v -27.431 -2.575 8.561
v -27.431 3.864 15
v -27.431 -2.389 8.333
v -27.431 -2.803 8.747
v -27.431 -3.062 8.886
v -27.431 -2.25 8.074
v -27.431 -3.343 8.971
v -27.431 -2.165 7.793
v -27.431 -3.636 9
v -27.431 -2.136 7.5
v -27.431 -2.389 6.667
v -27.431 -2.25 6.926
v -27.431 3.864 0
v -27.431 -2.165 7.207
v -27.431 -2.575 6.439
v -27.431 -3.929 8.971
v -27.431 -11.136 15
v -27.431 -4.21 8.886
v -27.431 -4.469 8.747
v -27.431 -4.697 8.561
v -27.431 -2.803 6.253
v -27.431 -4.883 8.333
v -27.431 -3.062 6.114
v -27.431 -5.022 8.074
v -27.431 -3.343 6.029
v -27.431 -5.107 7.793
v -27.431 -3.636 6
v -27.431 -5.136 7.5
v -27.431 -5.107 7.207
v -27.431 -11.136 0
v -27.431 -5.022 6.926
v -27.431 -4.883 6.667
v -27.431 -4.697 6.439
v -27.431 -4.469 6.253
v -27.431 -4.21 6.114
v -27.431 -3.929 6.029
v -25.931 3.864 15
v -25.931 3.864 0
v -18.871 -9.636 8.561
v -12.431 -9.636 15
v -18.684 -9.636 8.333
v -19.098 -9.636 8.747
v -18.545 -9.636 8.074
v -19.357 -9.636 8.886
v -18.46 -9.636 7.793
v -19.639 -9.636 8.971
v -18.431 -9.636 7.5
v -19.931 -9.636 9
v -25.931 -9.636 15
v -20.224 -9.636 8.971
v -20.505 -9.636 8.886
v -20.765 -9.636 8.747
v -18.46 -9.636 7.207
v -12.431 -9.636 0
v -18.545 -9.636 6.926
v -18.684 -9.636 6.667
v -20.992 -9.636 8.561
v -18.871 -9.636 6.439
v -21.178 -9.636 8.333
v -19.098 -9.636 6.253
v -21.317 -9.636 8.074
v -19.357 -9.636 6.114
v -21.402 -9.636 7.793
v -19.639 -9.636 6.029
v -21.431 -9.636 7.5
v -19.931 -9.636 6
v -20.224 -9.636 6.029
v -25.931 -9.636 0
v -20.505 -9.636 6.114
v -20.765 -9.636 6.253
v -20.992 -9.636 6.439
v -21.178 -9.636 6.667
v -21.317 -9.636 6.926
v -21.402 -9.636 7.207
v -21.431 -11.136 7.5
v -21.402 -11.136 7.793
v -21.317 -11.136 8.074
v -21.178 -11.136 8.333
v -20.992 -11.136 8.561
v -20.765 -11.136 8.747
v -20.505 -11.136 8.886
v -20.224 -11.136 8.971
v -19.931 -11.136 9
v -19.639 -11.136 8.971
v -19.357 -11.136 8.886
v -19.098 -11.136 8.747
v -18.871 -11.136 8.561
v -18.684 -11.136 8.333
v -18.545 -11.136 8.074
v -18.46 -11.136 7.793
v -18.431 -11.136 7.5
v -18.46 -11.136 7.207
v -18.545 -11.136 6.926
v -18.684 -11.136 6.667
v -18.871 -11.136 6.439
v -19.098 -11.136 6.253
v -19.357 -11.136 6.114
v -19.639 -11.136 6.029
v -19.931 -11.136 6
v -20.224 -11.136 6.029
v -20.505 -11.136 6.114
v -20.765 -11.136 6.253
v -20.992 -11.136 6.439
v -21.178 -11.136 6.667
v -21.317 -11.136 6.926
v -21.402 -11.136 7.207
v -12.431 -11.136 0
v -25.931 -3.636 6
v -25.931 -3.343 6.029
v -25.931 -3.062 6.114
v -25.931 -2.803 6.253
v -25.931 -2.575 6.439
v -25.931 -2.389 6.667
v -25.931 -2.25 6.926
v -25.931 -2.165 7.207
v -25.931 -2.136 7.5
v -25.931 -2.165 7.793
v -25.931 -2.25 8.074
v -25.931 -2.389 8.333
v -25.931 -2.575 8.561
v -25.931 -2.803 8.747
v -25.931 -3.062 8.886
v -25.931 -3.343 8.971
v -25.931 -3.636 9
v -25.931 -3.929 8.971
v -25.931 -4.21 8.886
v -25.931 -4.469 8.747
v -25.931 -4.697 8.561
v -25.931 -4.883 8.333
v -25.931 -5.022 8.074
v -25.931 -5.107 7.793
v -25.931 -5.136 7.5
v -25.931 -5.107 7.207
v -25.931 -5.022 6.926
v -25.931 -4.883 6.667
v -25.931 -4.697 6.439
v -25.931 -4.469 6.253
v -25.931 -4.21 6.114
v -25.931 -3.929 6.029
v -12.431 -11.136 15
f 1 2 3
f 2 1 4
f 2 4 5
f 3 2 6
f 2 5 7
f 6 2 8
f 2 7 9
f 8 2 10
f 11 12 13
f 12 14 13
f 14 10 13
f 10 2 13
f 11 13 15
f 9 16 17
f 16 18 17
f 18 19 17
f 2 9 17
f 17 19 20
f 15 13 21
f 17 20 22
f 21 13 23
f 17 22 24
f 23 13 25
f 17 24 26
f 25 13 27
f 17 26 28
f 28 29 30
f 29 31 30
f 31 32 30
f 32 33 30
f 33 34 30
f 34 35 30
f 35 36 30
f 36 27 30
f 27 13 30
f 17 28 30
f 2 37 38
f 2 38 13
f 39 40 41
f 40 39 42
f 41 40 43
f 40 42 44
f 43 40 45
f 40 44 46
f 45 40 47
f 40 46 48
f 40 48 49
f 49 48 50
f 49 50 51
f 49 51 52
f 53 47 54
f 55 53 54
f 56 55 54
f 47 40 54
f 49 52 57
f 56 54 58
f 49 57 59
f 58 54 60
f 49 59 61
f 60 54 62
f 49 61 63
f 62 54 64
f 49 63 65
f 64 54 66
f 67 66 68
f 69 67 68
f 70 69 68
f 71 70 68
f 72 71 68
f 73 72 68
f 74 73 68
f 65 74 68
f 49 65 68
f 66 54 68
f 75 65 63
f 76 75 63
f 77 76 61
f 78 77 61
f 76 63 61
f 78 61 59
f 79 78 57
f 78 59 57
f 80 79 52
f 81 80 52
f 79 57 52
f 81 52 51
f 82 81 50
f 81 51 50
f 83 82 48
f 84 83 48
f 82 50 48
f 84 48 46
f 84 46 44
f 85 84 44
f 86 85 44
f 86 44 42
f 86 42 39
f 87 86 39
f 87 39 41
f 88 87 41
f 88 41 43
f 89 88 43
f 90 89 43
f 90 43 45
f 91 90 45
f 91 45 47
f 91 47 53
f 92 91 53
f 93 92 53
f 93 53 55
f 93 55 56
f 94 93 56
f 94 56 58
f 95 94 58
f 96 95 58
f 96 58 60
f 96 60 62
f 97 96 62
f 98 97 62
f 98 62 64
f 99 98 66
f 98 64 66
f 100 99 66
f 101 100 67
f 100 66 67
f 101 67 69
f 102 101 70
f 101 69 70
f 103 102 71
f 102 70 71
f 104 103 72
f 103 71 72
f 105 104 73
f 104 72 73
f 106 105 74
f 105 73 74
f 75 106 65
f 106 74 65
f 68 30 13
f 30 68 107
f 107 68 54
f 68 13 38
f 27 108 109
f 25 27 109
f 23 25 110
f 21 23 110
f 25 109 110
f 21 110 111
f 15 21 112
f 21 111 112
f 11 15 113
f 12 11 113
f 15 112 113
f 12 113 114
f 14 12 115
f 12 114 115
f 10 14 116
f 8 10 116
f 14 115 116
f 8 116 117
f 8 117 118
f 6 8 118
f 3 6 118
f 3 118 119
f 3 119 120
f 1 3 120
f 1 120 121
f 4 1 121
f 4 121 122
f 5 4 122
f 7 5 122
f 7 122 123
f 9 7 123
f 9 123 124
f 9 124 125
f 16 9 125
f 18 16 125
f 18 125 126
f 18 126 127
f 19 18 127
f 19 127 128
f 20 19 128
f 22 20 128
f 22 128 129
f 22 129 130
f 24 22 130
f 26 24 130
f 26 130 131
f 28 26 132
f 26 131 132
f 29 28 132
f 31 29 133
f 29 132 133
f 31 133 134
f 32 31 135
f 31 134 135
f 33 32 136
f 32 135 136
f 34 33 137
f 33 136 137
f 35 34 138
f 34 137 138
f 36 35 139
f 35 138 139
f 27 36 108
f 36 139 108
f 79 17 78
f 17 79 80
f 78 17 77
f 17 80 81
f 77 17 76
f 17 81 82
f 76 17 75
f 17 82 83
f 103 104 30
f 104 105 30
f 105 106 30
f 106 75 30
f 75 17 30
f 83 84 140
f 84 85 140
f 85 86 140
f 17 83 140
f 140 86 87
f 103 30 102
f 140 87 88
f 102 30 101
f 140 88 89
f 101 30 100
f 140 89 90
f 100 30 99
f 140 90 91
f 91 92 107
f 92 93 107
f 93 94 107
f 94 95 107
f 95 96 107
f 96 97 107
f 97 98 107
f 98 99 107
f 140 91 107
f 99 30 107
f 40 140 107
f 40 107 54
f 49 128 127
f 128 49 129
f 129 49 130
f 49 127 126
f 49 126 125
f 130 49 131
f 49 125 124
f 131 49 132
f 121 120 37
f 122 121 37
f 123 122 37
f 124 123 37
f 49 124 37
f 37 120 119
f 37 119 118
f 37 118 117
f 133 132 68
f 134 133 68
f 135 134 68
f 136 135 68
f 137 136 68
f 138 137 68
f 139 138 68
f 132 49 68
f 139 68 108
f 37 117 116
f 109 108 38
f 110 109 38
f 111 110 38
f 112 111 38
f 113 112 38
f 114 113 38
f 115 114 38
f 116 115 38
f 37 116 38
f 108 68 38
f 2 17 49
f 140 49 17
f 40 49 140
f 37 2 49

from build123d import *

# Parameters (mm, degrees)
EXTRUSION1_DEPTH = 15
ESQUISSE2_R      = 1.5
EXTRUSION2_DEPTH = 15
ESQUISSE3_R      = 1.5
EXTRUSION3_DEPTH = 15


with BuildPart() as part:
    # Esquisse1 → Extrusion1 (new body)
    with BuildSketch(Plane.XY):
        Polygon((-27.431265327, 3.864105263), (-27.431265327, -11.135894737), (-12.431265327, -11.135894737), (-12.431265327, -9.635894737), (-25.931265327, -9.635894737), (-25.931265327, 3.864105263), align=None)
    extrude(amount=EXTRUSION1_DEPTH)

    # Esquisse2 → Extrusion2 (cut)
    with BuildSketch(Plane(origin=(-25.931265327, 0, 0), x_dir=(0, 0, -1), z_dir=(1, 0, 0))):
        with Locations((-7.5, -3.635894737)):
            Circle(ESQUISSE2_R)
    extrude(amount=-EXTRUSION2_DEPTH, mode=Mode.SUBTRACT)

    # Esquisse3 → Extrusion3 (cut)
    with BuildSketch(Plane(origin=(0, -9.635894737, 0), x_dir=(-1, 0, 0), z_dir=(0, 1, 0))):
        with Locations((19.931265327, 7.5)):
            Circle(ESQUISSE3_R)
    extrude(amount=-EXTRUSION3_DEPTH, mode=Mode.SUBTRACT)


solid = part.part
